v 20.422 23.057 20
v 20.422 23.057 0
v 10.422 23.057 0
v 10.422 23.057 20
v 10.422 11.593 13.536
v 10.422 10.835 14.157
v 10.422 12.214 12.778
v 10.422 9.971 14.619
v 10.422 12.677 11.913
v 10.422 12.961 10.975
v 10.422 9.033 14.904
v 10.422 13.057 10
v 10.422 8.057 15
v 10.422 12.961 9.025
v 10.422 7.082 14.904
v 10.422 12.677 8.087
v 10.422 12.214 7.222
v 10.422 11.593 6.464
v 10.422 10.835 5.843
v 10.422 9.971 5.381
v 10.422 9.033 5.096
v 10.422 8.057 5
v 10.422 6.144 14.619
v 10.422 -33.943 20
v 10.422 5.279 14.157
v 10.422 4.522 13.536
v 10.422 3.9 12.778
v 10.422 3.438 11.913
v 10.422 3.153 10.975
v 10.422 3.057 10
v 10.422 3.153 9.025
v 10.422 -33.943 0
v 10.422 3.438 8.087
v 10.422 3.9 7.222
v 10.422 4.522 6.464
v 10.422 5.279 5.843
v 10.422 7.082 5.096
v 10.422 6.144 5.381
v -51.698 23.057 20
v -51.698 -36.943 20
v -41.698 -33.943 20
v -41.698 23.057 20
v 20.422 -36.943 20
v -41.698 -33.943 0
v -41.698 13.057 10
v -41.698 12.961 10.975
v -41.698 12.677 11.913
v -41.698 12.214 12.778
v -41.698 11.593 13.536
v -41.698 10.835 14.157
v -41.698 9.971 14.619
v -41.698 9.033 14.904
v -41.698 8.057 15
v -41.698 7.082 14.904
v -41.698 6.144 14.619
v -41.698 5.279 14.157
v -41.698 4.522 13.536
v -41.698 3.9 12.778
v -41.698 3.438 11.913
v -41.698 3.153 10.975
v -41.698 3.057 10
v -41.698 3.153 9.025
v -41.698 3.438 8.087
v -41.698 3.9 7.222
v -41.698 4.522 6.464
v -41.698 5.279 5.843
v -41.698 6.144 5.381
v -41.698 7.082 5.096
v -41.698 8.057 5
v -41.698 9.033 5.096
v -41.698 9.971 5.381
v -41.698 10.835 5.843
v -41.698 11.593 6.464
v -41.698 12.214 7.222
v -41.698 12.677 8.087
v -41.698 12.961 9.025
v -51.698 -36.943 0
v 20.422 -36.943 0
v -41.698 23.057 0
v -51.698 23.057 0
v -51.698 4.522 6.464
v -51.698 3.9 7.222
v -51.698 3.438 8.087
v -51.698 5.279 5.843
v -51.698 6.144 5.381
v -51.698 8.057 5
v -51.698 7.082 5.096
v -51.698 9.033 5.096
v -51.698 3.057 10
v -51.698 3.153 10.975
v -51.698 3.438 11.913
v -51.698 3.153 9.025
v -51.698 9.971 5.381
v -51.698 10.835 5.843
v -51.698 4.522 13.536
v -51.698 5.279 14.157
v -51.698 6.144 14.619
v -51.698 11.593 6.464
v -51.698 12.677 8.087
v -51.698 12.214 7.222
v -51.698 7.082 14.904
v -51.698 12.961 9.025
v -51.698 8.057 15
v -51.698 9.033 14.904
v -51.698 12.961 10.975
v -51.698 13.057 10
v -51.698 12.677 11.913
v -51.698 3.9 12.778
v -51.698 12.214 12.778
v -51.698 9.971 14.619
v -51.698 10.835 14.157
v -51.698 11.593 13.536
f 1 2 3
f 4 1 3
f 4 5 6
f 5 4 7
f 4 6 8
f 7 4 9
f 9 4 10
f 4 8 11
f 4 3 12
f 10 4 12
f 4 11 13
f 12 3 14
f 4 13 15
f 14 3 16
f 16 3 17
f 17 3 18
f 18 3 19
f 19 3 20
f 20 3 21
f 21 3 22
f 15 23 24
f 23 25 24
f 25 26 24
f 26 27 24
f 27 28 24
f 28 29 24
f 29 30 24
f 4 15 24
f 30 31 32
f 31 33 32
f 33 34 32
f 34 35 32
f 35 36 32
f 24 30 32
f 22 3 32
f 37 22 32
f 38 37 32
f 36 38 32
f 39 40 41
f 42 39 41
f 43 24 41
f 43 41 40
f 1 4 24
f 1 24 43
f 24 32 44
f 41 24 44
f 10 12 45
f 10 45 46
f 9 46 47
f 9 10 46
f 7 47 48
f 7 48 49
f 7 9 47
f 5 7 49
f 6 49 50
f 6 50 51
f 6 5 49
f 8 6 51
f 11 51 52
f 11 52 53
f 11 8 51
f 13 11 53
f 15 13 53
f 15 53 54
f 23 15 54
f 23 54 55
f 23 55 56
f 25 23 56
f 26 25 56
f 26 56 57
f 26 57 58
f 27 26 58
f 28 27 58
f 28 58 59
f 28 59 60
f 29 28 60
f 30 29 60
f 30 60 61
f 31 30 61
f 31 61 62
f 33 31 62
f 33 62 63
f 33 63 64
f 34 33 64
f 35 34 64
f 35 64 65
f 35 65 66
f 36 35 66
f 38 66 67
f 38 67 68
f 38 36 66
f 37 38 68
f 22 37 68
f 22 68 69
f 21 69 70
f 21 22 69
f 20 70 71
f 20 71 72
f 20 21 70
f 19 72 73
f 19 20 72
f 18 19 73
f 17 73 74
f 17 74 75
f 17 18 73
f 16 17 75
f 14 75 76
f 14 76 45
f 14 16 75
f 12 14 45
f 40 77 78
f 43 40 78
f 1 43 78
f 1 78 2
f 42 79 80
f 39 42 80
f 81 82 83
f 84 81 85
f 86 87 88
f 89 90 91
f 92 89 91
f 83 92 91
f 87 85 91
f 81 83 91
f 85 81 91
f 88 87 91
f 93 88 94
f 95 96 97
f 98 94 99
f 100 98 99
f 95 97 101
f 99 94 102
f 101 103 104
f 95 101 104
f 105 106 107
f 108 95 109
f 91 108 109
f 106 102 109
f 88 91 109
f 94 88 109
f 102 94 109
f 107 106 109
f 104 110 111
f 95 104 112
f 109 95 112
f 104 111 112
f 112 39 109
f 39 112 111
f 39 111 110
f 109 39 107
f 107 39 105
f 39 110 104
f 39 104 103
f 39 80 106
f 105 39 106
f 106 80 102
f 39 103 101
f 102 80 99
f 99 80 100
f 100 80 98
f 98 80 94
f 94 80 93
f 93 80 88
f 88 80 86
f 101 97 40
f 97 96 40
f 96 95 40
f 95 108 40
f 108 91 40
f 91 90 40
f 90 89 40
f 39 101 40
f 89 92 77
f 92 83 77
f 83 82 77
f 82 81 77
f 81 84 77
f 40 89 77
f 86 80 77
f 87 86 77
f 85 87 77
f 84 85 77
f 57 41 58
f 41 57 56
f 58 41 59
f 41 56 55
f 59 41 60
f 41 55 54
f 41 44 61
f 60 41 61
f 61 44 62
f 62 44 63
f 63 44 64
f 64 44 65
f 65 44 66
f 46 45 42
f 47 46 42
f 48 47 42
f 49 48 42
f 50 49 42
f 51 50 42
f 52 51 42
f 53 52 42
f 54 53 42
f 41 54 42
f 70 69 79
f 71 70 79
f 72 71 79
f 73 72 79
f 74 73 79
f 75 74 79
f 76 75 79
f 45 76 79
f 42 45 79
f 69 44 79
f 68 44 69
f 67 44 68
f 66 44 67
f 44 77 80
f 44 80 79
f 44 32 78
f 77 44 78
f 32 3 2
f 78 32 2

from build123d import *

# Parameters (mm, degrees)
BOSS_EXTRUDE1_DEPTH = 20
SKETCH2_R           = 5
BOSS_EXTRUDE2_DEPTH = 72.120579


with BuildPart() as part:
    # Sketch1 → Boss-Extrude1 (new body)
    with BuildSketch(Plane.XY):
        Polygon((-51.698191127, 23.057124059), (-51.698191127, -36.942875941), (20.422387717, -36.942875941), (20.422387717, 23.057124059), (10.422387717, 23.057124059), (10.422387717, -33.942875941), (-41.698191127, -33.942875941), (-41.698191127, 23.057124059), align=None)
    extrude(amount=BOSS_EXTRUDE1_DEPTH)

    # Sketch2 → Boss-Extrude2 (add)
    with BuildSketch(Plane(origin=(20.422387717, 0, 0), x_dir=(0, 0, -1), z_dir=(1, 0, 0))):
        with Locations(Location((-10, 8.057124059, 0), (0, 0, 90))):
            Circle(SKETCH2_R)
    extrude(amount=-BOSS_EXTRUDE2_DEPTH)


solid = part.part
